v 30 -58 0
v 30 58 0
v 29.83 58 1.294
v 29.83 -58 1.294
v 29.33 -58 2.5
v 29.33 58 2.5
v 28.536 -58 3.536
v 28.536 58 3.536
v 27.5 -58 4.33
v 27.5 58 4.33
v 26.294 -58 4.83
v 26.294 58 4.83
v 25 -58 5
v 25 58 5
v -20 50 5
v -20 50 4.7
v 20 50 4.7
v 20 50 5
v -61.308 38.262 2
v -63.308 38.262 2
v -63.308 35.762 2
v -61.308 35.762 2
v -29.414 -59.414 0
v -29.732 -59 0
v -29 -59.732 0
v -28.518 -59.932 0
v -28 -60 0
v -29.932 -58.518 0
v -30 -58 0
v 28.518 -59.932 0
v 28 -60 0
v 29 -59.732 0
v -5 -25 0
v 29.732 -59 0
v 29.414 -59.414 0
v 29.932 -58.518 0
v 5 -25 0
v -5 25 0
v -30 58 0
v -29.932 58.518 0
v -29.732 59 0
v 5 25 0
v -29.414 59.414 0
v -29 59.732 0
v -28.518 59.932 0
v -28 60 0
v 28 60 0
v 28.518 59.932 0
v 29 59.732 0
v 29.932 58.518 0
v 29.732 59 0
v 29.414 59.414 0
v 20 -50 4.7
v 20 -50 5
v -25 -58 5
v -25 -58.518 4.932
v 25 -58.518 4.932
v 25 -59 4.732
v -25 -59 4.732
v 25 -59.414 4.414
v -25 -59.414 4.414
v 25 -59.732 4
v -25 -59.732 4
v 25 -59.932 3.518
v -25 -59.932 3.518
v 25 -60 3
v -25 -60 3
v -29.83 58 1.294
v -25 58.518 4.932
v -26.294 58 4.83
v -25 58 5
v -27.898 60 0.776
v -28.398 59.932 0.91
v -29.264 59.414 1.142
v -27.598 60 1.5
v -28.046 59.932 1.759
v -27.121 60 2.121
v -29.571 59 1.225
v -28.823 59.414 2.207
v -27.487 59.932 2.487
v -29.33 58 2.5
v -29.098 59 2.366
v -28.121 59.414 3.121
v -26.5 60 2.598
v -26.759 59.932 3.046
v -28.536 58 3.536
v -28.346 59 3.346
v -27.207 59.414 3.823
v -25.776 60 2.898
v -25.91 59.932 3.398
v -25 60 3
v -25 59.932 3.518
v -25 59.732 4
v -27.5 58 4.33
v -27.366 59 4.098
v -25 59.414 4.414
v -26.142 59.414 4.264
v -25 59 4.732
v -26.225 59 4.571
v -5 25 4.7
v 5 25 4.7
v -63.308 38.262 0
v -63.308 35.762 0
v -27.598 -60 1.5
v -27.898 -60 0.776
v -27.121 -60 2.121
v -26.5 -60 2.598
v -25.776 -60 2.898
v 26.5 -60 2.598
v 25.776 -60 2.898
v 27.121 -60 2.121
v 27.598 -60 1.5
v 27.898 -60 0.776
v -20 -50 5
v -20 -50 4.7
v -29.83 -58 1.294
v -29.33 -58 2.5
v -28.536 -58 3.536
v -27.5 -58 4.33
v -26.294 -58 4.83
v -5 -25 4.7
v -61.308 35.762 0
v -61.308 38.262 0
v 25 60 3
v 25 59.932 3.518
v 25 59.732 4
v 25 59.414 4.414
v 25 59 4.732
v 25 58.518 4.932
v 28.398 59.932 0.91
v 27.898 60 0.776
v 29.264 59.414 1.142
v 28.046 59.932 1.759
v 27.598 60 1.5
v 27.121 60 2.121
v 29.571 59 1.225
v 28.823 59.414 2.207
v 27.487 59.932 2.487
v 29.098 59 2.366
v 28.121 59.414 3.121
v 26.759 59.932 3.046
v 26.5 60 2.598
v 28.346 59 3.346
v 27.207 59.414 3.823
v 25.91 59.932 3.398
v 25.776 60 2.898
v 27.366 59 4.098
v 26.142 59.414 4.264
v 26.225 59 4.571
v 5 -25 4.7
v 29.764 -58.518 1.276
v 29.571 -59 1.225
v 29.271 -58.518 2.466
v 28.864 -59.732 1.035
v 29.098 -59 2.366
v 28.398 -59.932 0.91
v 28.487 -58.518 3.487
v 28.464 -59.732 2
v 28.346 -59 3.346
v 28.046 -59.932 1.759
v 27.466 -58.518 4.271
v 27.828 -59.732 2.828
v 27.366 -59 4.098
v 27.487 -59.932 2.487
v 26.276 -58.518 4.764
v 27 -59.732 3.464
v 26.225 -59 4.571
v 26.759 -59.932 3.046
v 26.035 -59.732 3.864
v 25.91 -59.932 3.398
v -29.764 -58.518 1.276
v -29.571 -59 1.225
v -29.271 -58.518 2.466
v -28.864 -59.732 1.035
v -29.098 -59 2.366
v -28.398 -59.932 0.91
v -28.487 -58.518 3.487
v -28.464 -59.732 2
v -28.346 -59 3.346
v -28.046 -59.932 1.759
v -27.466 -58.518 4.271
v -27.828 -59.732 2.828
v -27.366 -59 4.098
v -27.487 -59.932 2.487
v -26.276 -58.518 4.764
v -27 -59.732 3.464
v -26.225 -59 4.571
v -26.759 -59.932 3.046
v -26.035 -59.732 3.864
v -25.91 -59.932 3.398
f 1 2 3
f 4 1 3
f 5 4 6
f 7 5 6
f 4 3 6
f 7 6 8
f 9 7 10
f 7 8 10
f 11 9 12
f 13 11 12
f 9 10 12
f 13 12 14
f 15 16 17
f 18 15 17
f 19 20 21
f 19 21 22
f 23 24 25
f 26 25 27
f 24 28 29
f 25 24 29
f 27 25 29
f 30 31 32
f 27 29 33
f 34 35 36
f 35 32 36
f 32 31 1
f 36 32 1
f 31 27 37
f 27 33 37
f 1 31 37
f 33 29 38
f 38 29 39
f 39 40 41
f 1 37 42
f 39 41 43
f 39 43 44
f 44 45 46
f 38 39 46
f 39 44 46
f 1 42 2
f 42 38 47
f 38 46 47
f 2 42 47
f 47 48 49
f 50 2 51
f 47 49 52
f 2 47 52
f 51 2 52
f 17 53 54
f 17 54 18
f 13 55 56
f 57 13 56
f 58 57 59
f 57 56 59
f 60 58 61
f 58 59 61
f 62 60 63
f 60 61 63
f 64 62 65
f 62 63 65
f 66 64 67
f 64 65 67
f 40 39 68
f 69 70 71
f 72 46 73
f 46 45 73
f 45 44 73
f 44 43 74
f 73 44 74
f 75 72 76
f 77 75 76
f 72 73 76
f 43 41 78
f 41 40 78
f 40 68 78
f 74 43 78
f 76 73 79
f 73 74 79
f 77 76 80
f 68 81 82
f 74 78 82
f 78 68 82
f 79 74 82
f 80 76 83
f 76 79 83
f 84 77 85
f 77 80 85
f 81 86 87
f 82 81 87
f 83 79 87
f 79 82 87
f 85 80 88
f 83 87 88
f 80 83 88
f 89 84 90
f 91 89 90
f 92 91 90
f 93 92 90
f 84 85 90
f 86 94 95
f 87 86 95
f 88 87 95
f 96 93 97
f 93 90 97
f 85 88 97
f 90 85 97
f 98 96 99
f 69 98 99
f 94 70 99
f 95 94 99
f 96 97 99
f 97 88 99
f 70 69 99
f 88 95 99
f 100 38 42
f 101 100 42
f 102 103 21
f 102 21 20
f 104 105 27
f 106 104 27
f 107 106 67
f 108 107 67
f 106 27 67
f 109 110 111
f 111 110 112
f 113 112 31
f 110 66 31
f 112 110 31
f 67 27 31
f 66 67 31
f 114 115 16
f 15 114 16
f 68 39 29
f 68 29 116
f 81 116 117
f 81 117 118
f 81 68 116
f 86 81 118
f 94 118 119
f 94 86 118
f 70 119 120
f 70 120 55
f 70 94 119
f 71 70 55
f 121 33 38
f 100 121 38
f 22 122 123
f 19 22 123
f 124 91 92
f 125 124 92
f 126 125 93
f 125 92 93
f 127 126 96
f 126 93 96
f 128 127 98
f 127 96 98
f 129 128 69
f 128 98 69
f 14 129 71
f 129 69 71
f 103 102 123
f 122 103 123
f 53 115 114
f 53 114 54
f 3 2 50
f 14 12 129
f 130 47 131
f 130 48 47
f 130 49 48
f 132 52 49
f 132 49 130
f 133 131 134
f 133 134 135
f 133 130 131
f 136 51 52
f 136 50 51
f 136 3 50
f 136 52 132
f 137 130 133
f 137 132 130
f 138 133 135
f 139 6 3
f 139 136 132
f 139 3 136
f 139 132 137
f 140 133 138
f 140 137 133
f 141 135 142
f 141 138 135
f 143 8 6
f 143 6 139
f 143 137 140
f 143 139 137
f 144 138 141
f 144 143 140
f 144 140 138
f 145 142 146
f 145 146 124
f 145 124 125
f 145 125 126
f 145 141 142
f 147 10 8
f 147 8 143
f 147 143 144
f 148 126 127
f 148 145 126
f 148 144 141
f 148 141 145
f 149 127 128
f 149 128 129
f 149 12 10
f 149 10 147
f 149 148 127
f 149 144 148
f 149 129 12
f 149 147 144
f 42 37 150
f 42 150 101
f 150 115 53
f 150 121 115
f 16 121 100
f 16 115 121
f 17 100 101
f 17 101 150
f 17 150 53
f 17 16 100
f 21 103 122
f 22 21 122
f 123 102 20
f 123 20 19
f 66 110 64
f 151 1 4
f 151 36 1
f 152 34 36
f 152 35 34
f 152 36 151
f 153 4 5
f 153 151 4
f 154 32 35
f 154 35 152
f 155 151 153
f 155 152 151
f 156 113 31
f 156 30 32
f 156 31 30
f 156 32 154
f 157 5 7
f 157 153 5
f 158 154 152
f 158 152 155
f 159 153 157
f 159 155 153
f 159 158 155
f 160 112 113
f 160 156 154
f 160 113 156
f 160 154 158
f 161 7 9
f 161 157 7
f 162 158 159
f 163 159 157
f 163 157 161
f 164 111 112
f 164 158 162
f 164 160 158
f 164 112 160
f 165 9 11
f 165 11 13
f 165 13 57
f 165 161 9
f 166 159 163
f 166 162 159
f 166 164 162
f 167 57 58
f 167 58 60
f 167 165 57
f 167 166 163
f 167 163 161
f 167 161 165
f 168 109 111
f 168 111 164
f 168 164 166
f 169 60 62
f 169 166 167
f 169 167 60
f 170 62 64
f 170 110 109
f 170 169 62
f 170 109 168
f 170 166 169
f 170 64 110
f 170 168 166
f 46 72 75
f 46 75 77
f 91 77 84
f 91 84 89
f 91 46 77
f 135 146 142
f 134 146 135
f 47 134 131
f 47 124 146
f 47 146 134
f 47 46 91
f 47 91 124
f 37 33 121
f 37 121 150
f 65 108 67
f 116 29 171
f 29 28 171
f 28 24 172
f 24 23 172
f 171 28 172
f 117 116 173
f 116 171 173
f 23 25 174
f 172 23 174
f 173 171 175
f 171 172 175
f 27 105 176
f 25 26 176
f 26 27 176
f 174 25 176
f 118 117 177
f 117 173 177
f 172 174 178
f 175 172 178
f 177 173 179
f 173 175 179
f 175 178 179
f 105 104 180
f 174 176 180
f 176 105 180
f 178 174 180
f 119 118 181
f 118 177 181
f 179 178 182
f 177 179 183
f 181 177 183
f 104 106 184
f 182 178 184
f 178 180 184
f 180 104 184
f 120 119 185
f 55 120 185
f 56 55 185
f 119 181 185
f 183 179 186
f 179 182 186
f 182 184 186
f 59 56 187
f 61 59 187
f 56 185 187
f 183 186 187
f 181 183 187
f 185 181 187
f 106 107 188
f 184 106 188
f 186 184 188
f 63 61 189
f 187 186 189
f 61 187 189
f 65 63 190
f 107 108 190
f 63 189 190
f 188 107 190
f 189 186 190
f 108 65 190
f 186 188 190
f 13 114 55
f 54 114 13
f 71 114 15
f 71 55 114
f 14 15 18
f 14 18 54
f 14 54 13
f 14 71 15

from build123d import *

# Parameters (mm, degrees)
F0_W         = 60
F0_H         = 120
F0_W_2       = 40
F0_H_2       = 100
F1_DEPTH     = 5
F2_R         = 4.99999
F3_T1_DEPTH  = 50.00002
F3_T3_DEPTH  = 5.00001
F3_T6_ANGLE  = 90
F3_T8_ANGLE  = 90
F3_T10_ANGLE = 90
F3_T12_ANGLE = 90
F0_W_3       = 10
F0_H_3       = 50
F4_DEPTH     = 4.7
F5_W         = 2
F5_H         = 2.5
F6_DEPTH     = 2


# Not quite as in the source:
# - a fillet or chamfer that OpenCascade refuses, or shapes differently, is made with other operations: its cross-section is extruded or revolved along the edge and cut away or added
# - a fillet or chamfer is up to 0.001 mm smaller than in the source, because OpenCascade refuses the exact size


with BuildPart() as f1:
    # F0 (on Top) → F1 (new body)
    with BuildSketch(Plane.XY):
        Rectangle(F0_W, F0_H)
        Rectangle(F0_W_2, F0_H_2, mode=Mode.SUBTRACT)
    extrude(amount=F1_DEPTH)

    # F2 (radius 5 in the source; OpenCascade refuses exactly that, so slightly less here)
    f2_edges = [f1.edges().sort_by_distance(p)[0] for p in [
        (-30, 0, 5),
        (30, 0, 5),
    ]]
    fillet(f2_edges, radius=F2_R)

    # F3: fillet of radius 2 on 2 edges, made by hand

    # F3_s2 → F3_t1 (cut)
    with BuildSketch(Plane.YZ.offset(-25.00001)):
        with BuildLine():
            ThreePointArc((60, 3), (59.4142135624, 4.4142135624), (58, 5))
            Line((58, 5), (60, 5))
            Line((60, 5), (60, 3))
        make_face()
        with BuildLine():
            ThreePointArc((-58, 5), (-59.4142135624, 4.4142135624), (-60, 3))
            Line((-60, 3), (-60, 5))
            Line((-60, 5), (-58, 5))
        make_face()
    extrude(amount=F3_T1_DEPTH, mode=Mode.SUBTRACT)

    # F3_s4 → F3_t3 (cut)
    with BuildSketch(Plane.XY.offset(-5)):
        with BuildLine():
            ThreePointArc((30, -58), (29.4142135624, -59.4142135624), (28, -60))
            Line((28, -60), (30, -60))
            Line((30, -60), (30, -58))
        make_face()
        with BuildLine():
            ThreePointArc((-30, -58), (-29.4142135624, -59.4142135624), (-28, -60))
            Line((-28, -60), (-30, -60))
            Line((-30, -60), (-30, -58))
        make_face()
        with BuildLine():
            ThreePointArc((-28, 60), (-29.4142135624, 59.4142135624), (-30, 58))
            Line((-30, 58), (-30, 60))
            Line((-30, 60), (-28, 60))
        make_face()
        with BuildLine():
            ThreePointArc((28, 60), (29.4142135624, 59.4142135624), (30, 58))
            Line((30, 58), (30, 60))
            Line((30, 60), (28, 60))
        make_face()
    extrude(amount=F3_T3_DEPTH, mode=Mode.SUBTRACT)

    # F3_s5 → F3_t6 (revolve, cut)
    with BuildSketch(Plane.XY.offset(1e-05)):
        with BuildLine():
            ThreePointArc((-30, -58), (-29.4142135624, -59.4142135624), (-28, -60))
            Line((-28, -60), (-30, -60))
            Line((-30, -60), (-30, -58))
        make_face()
    revolve(axis=Axis((-25.00001, -60, 1e-05), (0, 1, 0)), revolution_arc=F3_T6_ANGLE, mode=Mode.SUBTRACT)

    # F3_s7 → F3_t8 (revolve, cut)
    with BuildSketch(Plane.XY.offset(1e-05)):
        with BuildLine():
            ThreePointArc((30, -58), (29.4142135624, -59.4142135624), (28, -60))
            Line((28, -60), (30, -60))
            Line((30, -60), (30, -58))
        make_face()
    revolve(axis=Axis((25.00001, -60, 1e-05), (0, -1, 0)), revolution_arc=F3_T8_ANGLE, mode=Mode.SUBTRACT)

    # F3_s9 → F3_t10 (revolve, cut)
    with BuildSketch(Plane.XY.offset(1e-05)):
        with BuildLine():
            ThreePointArc((28, 60), (29.4142135624, 59.4142135624), (30, 58))
            Line((30, 58), (30, 60))
            Line((30, 60), (28, 60))
        make_face()
    revolve(axis=Axis((25.00001, 60, 1e-05), (0, -1, 0)), revolution_arc=F3_T10_ANGLE, mode=Mode.SUBTRACT)

    # F3_s11 → F3_t12 (revolve, cut)
    with BuildSketch(Plane.XY.offset(1e-05)):
        with BuildLine():
            ThreePointArc((-28, 60), (-29.4142135624, 59.4142135624), (-30, 58))
            Line((-30, 58), (-30, 60))
            Line((-30, 60), (-28, 60))
        make_face()
    revolve(axis=Axis((-25.00001, 60, 1e-05), (0, 1, 0)), revolution_arc=F3_T12_ANGLE, mode=Mode.SUBTRACT)

    # F0 (on Top) → F4 (join)
    with BuildSketch(Plane.XY):
        Rectangle(F0_W_2, F0_H_2)
        Rectangle(F0_W_3, F0_H_3, mode=Mode.SUBTRACT)
    extrude(amount=F4_DEPTH)


with BuildPart() as f6:
    # F5 (on Top) → F6 (new body)
    with BuildSketch(Plane.XY):
        with Locations((-62.3082230687, 37.0115598826)):
            Rectangle(F5_W, F5_H)
    extrude(amount=F6_DEPTH)


solid = Compound([f1.part, f6.part])
